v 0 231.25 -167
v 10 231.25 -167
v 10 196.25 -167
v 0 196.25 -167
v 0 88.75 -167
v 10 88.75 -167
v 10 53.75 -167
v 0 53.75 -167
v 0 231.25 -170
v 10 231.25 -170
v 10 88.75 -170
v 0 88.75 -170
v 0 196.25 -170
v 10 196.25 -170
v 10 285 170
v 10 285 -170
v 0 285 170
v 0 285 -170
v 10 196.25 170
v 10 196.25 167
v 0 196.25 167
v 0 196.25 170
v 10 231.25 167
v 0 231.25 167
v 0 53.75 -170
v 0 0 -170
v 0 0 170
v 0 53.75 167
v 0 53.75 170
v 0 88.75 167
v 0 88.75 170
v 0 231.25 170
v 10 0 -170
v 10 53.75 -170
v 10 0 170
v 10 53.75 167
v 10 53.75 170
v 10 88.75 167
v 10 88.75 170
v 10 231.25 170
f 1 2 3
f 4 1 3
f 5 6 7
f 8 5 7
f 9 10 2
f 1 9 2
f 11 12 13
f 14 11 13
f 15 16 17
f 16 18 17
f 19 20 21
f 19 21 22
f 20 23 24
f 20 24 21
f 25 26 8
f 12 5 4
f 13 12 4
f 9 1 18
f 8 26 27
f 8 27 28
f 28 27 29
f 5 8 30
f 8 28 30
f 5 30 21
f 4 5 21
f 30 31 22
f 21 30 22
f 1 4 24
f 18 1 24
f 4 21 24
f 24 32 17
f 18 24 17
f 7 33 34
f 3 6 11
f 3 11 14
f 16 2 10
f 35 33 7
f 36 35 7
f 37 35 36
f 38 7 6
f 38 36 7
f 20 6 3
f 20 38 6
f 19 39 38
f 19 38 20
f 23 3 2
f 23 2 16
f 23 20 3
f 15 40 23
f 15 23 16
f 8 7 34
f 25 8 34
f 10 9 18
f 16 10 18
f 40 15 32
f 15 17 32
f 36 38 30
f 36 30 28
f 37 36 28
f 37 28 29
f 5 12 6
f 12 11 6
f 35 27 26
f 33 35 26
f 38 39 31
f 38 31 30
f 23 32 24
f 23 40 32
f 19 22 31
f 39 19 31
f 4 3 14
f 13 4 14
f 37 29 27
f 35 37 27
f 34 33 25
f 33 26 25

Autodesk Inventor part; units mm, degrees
ref_plane "YZ Plane" through (0, 0, 0) normal (1, 0, 0) x (0, 1, 0)
ref_plane "XZ Plane" through (0, 0, 0) normal (0, 1, 0) x (-1, 0, 0)
ref_plane "XY Plane" through (0, 0, 0) normal (0, 0, 1) x (1, 0, 0)
sketch "스케치1" plane through (0, 0, 0) normal (1, 0, 0) x (0, 1, 0)
  line L0 (285, 170) -> (0, 170)
  line L1 (0, 170) -> (0, -170)
  line L2 (0, -170) -> (285, -170)
  line L3 (285, -170) -> (285, 170)
  point P0 (0, 0)
  point P1 (0, 0)
  dimension "d0" = 285
  dimension "d1" = 340
extrude "돌출1" add sketch "스케치1" along normal blind 10
sketch "스케치2" plane through (10, 0, 0) normal (1, 0, 0) x (0, 0, -1)
  line L0 (-170, 0) -> (170, 0) construction
  line L1 (170, 0) -> (170, 285) construction
  line L2 (170, 285) -> (-170, 285) construction
  line L3 (-170, 285) -> (-170, 0) construction
  line L4 (-170, 142.5) -> (170, 142.5) construction
  line L5 (-170, 213.75) -> (170, 213.75) construction
  line L6 (-170, 71.25) -> (170, 71.25) construction
  line L7 (-170, 231.25) -> (-167, 231.25)
  line L8 (-167, 231.25) -> (-167, 196.25)
  line L9 (-167, 196.25) -> (-170, 196.25)
  line L10 (-170, 196.25) -> (-170, 231.25)
  line L11 (-170, 88.75) -> (-167, 88.75)
  line L12 (-167, 88.75) -> (-167, 53.75)
  line L13 (-167, 53.75) -> (-170, 53.75)
  line L14 (-170, 53.75) -> (-170, 88.75)
  line L15 (170, 88.75) -> (167, 88.75)
  line L16 (167, 88.75) -> (167, 53.75)
  line L17 (167, 53.75) -> (170, 53.75)
  line L18 (170, 53.75) -> (170, 88.75)
  line L19 (170, 231.25) -> (167, 231.25)
  line L20 (167, 231.25) -> (167, 196.25)
  line L21 (167, 196.25) -> (170, 196.25)
  line L22 (170, 196.25) -> (170, 231.25)
  point P0 (0, 0)
  point P1 (-167, 213.75)
  point P2 (-167, 71.25)
  point P3 (167, 71.25)
  point P4 (167, 213.75)
  dimension "d4" = 142.5
  dimension "d5" = 71.25
  dimension "d6" = 71.25
  dimension "d7" = 3
  dimension "d8" = 35
  dimension "d9" = 3
  dimension "d10" = 35
  dimension "d11" = 3
  dimension "d12" = 35
  dimension "d13" = 3
  dimension "d14" = 35
extrude "돌출2" cut sketch "스케치2" against normal blind 10
properties part number "back_cowl"
